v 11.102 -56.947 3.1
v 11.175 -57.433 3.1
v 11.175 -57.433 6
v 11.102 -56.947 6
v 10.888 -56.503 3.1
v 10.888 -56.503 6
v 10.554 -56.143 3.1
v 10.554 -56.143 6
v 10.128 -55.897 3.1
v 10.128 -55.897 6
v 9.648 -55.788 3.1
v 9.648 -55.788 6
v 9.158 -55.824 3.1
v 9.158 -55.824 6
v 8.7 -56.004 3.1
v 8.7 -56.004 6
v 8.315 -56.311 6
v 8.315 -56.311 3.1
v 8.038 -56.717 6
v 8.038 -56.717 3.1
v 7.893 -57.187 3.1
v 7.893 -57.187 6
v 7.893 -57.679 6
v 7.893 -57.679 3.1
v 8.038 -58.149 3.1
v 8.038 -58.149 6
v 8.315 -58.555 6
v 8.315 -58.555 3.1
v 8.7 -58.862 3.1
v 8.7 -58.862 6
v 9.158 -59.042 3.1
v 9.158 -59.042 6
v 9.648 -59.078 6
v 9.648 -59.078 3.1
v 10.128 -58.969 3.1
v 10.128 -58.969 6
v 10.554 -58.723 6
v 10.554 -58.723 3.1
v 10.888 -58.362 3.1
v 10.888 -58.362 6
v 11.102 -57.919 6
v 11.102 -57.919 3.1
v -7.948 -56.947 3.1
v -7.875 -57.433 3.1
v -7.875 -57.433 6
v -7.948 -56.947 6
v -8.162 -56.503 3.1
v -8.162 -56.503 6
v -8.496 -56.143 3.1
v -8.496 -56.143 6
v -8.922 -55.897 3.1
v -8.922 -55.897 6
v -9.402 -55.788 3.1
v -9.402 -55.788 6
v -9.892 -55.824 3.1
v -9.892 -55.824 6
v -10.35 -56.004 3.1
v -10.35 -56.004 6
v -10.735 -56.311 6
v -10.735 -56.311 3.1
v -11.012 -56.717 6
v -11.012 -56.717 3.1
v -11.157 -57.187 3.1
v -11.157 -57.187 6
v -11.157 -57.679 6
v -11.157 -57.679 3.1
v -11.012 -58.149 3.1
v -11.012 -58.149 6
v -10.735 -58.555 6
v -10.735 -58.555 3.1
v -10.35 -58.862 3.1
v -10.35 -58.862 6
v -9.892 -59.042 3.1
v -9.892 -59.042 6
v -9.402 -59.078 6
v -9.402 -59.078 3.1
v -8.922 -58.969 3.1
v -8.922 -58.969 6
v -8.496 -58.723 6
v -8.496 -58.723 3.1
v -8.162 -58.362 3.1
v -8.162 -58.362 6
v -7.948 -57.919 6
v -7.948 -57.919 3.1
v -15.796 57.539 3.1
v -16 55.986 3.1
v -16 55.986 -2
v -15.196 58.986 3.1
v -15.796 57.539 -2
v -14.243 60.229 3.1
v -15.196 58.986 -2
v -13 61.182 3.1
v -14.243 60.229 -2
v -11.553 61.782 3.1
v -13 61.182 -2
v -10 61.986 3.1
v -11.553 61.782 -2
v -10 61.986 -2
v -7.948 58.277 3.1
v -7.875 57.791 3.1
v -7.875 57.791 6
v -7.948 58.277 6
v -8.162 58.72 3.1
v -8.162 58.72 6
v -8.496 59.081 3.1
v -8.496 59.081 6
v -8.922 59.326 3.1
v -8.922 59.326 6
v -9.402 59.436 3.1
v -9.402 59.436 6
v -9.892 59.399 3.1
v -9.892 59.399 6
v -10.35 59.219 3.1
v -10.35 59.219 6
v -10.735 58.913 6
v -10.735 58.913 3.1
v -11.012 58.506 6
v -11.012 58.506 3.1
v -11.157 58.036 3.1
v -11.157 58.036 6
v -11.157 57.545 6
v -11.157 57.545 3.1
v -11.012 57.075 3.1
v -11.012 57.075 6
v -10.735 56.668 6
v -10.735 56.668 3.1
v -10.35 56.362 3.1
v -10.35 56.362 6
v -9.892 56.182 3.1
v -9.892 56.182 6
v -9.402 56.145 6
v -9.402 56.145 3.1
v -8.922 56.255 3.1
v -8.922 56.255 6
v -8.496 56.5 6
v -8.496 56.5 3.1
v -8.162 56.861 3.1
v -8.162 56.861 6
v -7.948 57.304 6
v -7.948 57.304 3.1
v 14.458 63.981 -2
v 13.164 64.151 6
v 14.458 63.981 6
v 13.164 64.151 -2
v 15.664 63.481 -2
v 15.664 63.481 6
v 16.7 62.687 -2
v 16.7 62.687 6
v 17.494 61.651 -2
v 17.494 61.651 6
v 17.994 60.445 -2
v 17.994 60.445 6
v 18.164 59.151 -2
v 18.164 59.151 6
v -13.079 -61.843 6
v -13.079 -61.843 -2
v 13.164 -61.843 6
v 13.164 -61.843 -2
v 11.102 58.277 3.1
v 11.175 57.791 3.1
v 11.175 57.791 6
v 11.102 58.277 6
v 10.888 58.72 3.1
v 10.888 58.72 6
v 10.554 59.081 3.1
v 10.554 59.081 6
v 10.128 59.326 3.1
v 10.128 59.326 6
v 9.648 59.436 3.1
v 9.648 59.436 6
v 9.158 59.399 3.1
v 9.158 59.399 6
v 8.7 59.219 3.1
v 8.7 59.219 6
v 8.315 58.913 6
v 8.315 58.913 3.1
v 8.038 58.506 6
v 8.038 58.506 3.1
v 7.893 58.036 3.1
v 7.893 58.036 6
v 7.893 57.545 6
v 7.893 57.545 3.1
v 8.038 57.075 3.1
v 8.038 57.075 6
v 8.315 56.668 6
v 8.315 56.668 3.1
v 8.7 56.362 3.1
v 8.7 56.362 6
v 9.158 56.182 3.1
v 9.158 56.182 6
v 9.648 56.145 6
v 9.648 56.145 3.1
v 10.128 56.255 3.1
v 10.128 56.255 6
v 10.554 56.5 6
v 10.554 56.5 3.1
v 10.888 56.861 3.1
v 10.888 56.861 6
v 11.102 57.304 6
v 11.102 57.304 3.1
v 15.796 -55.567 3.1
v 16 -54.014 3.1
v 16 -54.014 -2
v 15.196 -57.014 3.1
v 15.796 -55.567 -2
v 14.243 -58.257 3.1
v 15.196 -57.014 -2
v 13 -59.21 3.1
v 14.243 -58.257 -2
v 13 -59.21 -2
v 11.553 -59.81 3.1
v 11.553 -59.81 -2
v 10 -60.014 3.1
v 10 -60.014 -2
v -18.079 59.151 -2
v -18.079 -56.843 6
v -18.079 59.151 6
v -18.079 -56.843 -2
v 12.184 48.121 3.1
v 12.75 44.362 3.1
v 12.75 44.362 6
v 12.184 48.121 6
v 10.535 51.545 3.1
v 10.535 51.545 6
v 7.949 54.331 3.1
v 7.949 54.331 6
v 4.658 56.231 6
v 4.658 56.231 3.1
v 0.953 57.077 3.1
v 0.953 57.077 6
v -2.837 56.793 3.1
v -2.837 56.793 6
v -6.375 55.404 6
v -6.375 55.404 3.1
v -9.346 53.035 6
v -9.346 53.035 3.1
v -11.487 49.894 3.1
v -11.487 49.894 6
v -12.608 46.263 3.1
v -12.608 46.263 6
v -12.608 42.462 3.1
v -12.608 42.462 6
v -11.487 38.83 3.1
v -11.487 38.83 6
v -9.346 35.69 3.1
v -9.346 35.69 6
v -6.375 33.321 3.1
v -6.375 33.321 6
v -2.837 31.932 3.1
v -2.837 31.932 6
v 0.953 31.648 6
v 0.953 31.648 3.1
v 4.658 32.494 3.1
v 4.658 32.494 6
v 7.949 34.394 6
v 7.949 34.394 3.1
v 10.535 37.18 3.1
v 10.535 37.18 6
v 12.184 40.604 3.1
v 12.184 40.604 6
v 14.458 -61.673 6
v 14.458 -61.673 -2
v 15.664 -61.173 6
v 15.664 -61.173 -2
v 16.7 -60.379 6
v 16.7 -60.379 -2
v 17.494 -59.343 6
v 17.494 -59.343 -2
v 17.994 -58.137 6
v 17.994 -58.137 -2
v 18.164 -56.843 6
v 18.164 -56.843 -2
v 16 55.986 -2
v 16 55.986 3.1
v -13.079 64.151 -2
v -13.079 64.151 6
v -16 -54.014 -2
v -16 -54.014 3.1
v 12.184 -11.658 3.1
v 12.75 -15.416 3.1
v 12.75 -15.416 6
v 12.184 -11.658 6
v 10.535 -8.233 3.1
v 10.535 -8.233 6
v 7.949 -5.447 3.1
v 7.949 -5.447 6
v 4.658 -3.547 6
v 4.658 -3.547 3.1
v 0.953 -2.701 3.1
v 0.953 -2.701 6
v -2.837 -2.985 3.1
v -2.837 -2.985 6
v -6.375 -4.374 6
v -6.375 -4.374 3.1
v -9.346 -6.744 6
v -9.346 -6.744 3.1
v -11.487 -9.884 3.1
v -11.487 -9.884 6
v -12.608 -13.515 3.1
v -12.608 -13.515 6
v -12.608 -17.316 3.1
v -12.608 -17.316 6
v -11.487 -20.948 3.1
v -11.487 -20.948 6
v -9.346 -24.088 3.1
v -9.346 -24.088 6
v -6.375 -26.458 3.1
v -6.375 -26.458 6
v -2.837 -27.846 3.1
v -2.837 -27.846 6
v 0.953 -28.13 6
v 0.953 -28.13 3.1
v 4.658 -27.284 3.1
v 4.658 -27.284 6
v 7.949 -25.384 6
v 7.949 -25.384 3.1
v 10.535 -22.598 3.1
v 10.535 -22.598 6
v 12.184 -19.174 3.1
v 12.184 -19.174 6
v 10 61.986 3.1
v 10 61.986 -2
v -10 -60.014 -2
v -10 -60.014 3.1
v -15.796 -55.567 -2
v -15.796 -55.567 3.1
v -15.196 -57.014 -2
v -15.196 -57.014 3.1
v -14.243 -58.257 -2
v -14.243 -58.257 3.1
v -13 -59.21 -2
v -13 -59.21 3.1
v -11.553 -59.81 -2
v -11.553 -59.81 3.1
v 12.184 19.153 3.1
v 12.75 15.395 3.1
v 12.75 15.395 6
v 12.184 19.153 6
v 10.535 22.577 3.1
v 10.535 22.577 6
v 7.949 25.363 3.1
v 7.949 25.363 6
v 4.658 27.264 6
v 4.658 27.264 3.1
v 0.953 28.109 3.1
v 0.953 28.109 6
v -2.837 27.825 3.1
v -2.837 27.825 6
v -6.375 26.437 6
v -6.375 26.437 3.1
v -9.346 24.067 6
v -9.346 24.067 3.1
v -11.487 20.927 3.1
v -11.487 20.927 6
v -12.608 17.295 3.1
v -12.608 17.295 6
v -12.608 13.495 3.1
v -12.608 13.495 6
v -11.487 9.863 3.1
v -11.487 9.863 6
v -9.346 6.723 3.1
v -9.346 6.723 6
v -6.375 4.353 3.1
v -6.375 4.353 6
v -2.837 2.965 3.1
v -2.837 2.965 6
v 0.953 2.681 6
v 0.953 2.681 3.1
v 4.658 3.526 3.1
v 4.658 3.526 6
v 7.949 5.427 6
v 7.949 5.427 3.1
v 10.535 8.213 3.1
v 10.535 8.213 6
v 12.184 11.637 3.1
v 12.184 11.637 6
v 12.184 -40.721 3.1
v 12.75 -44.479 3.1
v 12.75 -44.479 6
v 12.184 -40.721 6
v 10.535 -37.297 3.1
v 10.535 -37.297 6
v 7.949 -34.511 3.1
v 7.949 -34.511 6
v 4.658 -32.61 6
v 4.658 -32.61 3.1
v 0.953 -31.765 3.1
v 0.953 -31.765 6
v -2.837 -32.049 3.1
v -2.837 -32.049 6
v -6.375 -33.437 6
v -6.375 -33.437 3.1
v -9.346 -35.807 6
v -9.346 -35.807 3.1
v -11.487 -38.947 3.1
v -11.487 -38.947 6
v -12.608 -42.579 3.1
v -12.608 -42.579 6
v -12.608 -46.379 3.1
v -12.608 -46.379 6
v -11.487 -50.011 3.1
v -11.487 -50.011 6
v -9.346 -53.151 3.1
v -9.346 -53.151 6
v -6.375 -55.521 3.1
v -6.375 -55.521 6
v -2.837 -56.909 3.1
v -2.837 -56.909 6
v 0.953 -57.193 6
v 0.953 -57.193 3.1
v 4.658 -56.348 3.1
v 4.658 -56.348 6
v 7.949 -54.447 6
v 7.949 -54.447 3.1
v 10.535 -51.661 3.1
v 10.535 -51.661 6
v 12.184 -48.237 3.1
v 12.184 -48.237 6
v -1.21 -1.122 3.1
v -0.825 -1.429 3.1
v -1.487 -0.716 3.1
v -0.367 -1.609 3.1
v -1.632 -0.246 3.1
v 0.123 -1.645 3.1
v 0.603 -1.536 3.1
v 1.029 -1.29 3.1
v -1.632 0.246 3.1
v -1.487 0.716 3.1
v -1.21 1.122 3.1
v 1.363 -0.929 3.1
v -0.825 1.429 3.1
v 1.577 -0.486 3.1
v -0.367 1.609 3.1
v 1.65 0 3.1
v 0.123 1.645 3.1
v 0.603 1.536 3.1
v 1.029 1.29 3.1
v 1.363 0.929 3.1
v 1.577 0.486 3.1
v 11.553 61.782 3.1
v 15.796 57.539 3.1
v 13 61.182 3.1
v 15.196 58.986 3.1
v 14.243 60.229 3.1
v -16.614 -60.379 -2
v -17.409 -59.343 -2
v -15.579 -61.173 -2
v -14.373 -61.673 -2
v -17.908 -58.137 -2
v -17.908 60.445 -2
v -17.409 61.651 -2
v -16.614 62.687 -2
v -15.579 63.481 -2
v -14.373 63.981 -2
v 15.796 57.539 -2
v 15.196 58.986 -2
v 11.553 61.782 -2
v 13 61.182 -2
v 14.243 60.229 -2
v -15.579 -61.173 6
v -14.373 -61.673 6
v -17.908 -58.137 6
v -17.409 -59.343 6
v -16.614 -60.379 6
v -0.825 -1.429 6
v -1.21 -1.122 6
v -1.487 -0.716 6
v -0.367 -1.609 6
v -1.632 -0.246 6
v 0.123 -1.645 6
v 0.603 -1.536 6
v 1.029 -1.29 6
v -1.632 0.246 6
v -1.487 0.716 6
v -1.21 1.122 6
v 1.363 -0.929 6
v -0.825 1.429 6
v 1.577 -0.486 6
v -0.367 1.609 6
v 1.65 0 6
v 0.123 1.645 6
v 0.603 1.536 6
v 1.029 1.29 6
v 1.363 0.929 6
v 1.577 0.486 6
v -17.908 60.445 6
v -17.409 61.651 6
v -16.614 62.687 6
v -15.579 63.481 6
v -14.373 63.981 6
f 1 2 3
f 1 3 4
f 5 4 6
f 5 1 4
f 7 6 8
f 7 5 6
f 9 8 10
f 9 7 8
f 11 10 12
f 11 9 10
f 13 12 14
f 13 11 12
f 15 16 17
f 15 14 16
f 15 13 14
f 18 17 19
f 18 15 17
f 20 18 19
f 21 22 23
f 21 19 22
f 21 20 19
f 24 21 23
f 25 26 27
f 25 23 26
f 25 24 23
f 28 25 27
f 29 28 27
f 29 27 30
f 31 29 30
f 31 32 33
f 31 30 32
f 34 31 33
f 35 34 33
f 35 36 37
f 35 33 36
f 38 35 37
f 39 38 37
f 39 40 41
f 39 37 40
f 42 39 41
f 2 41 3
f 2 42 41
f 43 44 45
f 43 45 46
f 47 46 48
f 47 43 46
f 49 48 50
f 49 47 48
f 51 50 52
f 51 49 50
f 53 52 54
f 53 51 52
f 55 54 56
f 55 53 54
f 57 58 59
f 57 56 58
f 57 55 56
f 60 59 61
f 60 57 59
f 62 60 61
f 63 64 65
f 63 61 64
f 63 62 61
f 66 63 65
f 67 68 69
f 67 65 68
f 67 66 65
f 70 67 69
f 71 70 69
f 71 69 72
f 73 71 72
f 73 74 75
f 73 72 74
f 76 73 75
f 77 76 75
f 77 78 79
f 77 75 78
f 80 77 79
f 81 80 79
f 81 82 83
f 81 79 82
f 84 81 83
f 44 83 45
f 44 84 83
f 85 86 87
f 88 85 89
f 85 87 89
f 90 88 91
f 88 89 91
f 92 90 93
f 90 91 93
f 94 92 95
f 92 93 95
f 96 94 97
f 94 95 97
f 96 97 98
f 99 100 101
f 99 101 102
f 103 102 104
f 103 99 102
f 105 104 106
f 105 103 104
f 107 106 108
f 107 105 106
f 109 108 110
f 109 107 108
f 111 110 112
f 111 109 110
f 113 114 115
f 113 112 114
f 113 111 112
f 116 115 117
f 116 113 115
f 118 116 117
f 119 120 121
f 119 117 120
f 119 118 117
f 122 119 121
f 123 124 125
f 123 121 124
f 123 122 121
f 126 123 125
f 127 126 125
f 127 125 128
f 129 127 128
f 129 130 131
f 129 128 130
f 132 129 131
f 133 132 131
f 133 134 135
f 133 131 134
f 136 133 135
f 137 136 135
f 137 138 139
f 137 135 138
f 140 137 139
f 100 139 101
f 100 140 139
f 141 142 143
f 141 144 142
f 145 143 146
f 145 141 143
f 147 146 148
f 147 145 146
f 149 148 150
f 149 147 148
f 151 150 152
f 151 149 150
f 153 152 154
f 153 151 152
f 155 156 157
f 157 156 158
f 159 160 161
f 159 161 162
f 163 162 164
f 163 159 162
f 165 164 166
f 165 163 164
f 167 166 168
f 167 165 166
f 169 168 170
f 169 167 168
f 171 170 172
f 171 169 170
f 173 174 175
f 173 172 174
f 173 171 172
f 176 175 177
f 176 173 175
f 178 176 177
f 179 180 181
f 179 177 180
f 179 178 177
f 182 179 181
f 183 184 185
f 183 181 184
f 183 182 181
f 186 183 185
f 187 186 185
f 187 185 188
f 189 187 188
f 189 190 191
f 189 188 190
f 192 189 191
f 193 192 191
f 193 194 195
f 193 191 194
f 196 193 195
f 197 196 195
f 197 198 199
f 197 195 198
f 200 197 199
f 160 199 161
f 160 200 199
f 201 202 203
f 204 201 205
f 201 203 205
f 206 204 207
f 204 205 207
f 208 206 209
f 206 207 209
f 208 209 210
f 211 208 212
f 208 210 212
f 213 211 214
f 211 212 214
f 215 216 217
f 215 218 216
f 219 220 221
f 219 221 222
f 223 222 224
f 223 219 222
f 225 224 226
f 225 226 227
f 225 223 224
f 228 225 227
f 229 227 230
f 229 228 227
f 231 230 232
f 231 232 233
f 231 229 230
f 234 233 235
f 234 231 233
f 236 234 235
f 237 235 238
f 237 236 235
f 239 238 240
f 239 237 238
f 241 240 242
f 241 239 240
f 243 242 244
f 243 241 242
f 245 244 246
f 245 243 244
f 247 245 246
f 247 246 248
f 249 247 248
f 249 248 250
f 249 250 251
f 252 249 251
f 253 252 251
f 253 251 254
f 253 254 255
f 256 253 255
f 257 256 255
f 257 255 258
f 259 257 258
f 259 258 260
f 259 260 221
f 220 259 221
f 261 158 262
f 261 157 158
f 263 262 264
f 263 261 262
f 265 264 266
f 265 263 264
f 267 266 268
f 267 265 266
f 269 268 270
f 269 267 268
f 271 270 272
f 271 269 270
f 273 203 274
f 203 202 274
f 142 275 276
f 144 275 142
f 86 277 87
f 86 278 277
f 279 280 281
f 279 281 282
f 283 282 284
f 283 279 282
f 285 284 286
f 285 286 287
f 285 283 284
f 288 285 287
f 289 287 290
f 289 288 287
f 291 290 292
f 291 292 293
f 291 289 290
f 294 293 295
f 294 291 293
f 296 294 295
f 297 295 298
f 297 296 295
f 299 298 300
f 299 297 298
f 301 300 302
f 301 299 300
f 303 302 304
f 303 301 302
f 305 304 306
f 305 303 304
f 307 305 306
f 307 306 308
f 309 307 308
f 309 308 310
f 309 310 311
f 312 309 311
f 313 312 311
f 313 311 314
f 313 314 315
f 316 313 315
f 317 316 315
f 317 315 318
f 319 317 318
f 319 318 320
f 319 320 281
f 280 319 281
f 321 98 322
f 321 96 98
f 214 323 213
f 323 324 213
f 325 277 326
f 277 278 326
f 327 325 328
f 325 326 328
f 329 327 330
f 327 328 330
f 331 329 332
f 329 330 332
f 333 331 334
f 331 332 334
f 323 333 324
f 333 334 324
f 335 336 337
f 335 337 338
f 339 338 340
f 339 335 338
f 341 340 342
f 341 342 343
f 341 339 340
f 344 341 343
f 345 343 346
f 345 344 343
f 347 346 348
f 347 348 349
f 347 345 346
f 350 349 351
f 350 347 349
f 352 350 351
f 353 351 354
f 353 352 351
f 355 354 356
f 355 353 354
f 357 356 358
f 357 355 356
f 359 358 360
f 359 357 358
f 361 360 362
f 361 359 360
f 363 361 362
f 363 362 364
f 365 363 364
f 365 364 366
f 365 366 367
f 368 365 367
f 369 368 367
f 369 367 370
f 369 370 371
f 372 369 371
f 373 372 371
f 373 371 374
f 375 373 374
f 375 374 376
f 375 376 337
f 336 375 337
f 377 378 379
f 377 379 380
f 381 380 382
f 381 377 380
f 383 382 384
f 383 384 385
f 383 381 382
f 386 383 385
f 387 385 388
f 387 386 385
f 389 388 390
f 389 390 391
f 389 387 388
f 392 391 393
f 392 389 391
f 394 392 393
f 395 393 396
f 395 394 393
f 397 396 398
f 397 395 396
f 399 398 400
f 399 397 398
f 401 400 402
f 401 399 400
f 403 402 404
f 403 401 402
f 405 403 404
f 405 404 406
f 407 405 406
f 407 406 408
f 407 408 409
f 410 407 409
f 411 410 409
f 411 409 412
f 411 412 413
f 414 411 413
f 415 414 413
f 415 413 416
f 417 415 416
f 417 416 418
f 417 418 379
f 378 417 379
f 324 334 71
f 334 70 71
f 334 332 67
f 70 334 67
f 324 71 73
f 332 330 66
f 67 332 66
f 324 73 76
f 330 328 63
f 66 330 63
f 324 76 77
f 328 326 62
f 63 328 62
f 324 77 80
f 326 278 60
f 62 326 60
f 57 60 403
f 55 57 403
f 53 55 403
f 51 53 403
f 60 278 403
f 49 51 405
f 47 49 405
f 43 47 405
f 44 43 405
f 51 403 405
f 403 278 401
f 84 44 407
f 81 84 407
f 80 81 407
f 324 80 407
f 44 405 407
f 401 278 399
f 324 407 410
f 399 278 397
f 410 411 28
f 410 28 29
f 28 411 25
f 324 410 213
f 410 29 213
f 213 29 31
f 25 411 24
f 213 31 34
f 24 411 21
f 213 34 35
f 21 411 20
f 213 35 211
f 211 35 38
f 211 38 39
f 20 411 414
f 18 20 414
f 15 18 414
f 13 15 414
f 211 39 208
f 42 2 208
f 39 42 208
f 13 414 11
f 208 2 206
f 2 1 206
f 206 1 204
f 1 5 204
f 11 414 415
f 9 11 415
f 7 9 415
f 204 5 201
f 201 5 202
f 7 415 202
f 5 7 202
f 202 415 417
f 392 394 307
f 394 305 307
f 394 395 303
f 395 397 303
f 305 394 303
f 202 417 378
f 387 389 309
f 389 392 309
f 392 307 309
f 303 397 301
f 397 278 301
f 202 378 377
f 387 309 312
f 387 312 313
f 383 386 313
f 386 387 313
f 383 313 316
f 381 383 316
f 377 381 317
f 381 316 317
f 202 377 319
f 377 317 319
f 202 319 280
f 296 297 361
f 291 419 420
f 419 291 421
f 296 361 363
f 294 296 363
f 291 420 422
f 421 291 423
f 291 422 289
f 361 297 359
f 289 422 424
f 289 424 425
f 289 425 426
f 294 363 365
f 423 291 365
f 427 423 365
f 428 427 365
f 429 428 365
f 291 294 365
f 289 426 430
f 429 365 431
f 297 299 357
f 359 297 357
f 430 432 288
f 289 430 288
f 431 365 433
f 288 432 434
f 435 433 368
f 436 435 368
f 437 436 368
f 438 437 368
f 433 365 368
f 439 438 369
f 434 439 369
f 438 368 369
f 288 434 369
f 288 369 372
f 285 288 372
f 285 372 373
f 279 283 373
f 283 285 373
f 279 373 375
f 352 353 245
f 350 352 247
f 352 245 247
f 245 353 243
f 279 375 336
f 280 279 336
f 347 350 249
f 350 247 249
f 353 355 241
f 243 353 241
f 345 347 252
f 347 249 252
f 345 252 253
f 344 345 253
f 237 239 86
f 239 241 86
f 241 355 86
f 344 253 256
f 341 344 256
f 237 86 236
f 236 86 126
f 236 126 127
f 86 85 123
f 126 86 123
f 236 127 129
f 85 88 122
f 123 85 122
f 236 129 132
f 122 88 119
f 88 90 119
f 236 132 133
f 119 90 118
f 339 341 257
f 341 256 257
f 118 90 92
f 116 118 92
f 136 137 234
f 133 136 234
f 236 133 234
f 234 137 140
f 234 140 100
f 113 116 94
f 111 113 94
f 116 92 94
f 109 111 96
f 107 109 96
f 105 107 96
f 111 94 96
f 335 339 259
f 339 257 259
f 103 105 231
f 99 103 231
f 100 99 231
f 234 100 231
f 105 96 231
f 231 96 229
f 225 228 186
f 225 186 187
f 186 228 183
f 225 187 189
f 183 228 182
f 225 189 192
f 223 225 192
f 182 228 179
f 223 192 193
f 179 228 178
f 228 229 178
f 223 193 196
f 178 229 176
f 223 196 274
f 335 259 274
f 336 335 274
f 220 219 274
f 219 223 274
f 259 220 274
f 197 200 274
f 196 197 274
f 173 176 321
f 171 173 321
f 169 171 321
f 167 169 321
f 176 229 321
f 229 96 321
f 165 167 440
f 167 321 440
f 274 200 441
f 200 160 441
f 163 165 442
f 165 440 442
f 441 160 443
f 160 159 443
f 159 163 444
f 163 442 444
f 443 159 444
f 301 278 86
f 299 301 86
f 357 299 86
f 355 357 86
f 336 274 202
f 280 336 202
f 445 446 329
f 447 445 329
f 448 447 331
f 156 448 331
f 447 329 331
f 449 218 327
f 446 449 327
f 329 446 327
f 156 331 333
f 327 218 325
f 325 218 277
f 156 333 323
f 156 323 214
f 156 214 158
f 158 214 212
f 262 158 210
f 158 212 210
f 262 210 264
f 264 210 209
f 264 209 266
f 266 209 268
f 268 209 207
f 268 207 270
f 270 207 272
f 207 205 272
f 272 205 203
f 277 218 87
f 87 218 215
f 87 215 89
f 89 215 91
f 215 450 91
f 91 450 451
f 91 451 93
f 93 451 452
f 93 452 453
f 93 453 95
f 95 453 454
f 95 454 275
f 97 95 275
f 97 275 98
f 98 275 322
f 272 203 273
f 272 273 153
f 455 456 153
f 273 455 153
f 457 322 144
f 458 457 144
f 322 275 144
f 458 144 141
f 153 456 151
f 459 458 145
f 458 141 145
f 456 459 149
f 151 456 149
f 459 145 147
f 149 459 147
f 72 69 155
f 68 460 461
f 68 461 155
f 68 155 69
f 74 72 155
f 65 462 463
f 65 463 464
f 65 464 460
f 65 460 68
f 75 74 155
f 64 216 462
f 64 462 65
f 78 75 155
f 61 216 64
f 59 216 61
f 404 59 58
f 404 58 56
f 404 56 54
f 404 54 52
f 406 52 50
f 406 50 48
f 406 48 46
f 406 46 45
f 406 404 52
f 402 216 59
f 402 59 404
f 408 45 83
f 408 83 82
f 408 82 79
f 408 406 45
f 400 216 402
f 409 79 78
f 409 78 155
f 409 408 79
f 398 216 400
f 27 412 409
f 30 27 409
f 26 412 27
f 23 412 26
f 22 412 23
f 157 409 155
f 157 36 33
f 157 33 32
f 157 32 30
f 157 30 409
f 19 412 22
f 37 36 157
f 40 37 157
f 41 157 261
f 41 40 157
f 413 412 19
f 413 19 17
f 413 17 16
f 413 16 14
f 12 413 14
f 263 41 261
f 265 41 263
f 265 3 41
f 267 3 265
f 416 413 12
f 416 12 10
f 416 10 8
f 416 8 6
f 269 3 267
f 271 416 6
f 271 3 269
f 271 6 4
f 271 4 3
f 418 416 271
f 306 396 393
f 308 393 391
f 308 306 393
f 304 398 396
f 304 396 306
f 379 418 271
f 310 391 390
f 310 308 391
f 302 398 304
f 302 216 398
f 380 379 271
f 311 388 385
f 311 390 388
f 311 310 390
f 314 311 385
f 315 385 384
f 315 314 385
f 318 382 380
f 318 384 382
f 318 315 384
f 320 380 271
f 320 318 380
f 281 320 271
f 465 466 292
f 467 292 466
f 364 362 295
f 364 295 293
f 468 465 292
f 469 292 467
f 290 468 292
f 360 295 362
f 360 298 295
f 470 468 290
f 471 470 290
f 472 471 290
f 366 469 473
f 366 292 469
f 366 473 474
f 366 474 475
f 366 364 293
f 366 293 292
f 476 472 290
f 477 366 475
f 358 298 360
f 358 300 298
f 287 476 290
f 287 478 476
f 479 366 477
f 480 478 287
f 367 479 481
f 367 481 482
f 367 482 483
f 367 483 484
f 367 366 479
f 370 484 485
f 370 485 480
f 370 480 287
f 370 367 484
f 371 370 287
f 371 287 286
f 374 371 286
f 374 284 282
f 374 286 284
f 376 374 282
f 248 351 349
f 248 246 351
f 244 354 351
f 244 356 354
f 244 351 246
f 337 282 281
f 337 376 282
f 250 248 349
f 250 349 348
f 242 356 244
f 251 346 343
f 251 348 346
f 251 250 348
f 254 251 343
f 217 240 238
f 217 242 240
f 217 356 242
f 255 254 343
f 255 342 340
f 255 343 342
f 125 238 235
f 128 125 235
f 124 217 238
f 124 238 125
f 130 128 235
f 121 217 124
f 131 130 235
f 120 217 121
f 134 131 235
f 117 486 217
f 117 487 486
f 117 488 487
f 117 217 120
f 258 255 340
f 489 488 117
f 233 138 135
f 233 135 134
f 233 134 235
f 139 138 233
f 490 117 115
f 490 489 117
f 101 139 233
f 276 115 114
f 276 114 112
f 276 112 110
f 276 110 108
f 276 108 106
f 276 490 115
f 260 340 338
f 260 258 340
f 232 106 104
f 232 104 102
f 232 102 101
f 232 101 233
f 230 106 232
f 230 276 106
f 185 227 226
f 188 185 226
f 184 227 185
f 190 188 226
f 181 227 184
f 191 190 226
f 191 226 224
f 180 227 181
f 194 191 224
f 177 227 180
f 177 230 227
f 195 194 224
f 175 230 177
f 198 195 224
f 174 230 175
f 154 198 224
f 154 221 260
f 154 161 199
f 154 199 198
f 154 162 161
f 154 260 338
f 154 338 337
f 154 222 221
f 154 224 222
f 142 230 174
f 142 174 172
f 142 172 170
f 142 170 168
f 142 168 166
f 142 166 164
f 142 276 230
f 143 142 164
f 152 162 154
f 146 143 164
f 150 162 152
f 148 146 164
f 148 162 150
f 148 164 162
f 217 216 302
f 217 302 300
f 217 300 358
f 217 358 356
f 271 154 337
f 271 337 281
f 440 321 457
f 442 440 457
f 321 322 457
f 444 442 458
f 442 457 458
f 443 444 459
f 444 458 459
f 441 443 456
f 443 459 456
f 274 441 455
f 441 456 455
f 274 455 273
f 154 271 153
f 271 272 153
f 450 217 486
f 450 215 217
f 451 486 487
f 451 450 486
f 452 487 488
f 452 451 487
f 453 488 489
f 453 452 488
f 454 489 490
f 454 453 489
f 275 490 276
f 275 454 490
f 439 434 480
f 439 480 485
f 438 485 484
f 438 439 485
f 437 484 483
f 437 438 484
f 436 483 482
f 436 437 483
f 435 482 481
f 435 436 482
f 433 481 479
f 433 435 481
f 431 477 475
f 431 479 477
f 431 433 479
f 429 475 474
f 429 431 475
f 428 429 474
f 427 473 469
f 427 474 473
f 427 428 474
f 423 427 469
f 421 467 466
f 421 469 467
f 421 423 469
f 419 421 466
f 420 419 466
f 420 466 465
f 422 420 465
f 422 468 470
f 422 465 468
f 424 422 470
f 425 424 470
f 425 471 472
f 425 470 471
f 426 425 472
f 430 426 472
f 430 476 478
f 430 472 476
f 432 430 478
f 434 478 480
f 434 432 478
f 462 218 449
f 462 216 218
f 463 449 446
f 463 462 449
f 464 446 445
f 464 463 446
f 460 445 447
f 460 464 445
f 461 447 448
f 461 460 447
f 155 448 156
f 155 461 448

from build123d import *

# Parameters (mm, degrees)
F1_START      = 3.1
F0_W          = 32
F0_H          = 122
F0_R          = 1.65
F0_R_2        = 1.25
F0_R_3        = 12.75
F1_DEPTH      = 2.9
F2_START      = 3
F0_R_4        = 2
F0_R_5        = 1
F2_DEPTH      = 2
F3_DEPTH      = 25
F3_DEPTH_BACK = 39.8
F0_W_2        = 36.2426135689
F0_H_2        = 125.9943731129
F4_DEPTH      = 2
F4_DEPTH_BACK = 6
F5_R          = 6
F6_R          = 5


# Not quite as in the source:
# - a feature names something its author has since deleted; it is built from what else it names


with BuildPart() as f1:
    # F0 (on Top) → F1 (new body)
    with BuildSketch(Plane.XY.offset(F1_START)):
        with Locations((0, 0.9860133167)):
            Rectangle(F0_W, F0_H)
        with Locations((-9.525, -57.4329458177)):
            Circle(F0_R, mode=Mode.SUBTRACT)
        with Locations((-9.525, -30.4671674967)):
            Circle(F0_R_2, mode=Mode.SUBTRACT)
        with Locations((0, -44.4789328166)):
            Circle(F0_R_3, mode=Mode.SUBTRACT)
        with Locations((-9.525, 0)):
            Circle(F0_R_2, mode=Mode.SUBTRACT)
        with Locations((0, -15.4157546586)):
            Circle(F0_R_3, mode=Mode.SUBTRACT)
        Circle(F0_R, mode=Mode.SUBTRACT)
        with Locations((9.525, -57.4329458177)):
            Circle(F0_R, mode=Mode.SUBTRACT)
        with Locations((9.525, -30.4671674967)):
            Circle(F0_R_2, mode=Mode.SUBTRACT)
        with Locations((9.525, 0)):
            Circle(F0_R_2, mode=Mode.SUBTRACT)
        with Locations((-9.525, 29.1974432766)):
            Circle(F0_R_2, mode=Mode.SUBTRACT)
        with Locations((0, 15.3948861798)):
            Circle(F0_R_3, mode=Mode.SUBTRACT)
        with Locations((-9.525, 57.7905103564)):
            Circle(F0_R, mode=Mode.SUBTRACT)
        with Locations((0, 44.3624239764)):
            Circle(F0_R_3, mode=Mode.SUBTRACT)
        with Locations((9.525, 29.1974432766)):
            Circle(F0_R_2, mode=Mode.SUBTRACT)
        with Locations((9.525, 57.7905103564)):
            Circle(F0_R, mode=Mode.SUBTRACT)
        with Locations((9.525, 0)):
            Circle(F0_R_2)
        with Locations((-9.525, 0)):
            Circle(F0_R_2)
        with Locations((9.525, 29.1974432766)):
            Circle(F0_R_2)
        with Locations((-9.525, 29.1974432766)):
            Circle(F0_R_2)
        with Locations((9.525, -30.4671674967)):
            Circle(F0_R_2)
        with Locations((-9.525, -30.4671674967)):
            Circle(F0_R_2)
        with Locations((9.525, -57.4329458177)):
            Circle(F0_R)
        with Locations((-9.525, -57.4329458177)):
            Circle(F0_R)
        Circle(F0_R)
        with Locations((9.525, 57.7905103564)):
            Circle(F0_R)
        with Locations((-9.525, 57.7905103564)):
            Circle(F0_R)
    extrude(amount=F1_DEPTH)

    # F0 (on Top) → F2 (cut)
    with BuildSketch(Plane.XY.offset(F2_START)):
        with Locations((0, 44.3624239764)):
            Circle(F0_R_3)
        with Locations((-9.525, 44.3624239764)):
            Circle(F0_R_4, mode=Mode.SUBTRACT)
        with Locations((9.525, 44.3624239764)):
            Circle(F0_R_4, mode=Mode.SUBTRACT)
        with Locations((0, 15.3948861798)):
            Circle(F0_R_3)
        with Locations((-9.525, 15.3948861798)):
            Circle(F0_R_4, mode=Mode.SUBTRACT)
        with Locations((9.525, 15.3948861798)):
            Circle(F0_R_4, mode=Mode.SUBTRACT)
        with Locations((0, -15.4157546586)):
            Circle(F0_R_3)
        with Locations((-9.525, -15.4157546586)):
            Circle(F0_R_4, mode=Mode.SUBTRACT)
        with Locations((9.525, -15.4157546586)):
            Circle(F0_R_4, mode=Mode.SUBTRACT)
        with Locations((0, -44.4789328166)):
            Circle(F0_R_3)
        with Locations((-9.525, -44.4789328166)):
            Circle(F0_R_4, mode=Mode.SUBTRACT)
        with Locations((9.525, -44.4789328166)):
            Circle(F0_R_4, mode=Mode.SUBTRACT)
        with Locations((9.525, 44.3624239764)):
            Circle(F0_R_4)
        with Locations((9.525, 44.3624239764)):
            Circle(F0_R_5, mode=Mode.SUBTRACT)
        with Locations((-9.525, 44.3624239764)):
            Circle(F0_R_4)
        with Locations((-9.525, 44.3624239764)):
            Circle(F0_R_5, mode=Mode.SUBTRACT)
        with Locations((9.525, 15.3948861798)):
            Circle(F0_R_4)
        with Locations((9.525, 15.3948861798)):
            Circle(F0_R_5, mode=Mode.SUBTRACT)
        with Locations((-9.525, 15.3948861798)):
            Circle(F0_R_4)
        with Locations((-9.525, 15.3948861798)):
            Circle(F0_R_5, mode=Mode.SUBTRACT)
        with Locations((9.525, -15.4157546586)):
            Circle(F0_R_4)
        with Locations((9.525, -15.4157546586)):
            Circle(F0_R_5, mode=Mode.SUBTRACT)
        with Locations((-9.525, -15.4157546586)):
            Circle(F0_R_4)
        with Locations((-9.525, -15.4157546586)):
            Circle(F0_R_5, mode=Mode.SUBTRACT)
        with Locations((9.525, -44.4789328166)):
            Circle(F0_R_4)
        with Locations((9.525, -44.4789328166)):
            Circle(F0_R_5, mode=Mode.SUBTRACT)
        with Locations((-9.525, -44.4789328166)):
            Circle(F0_R_4)
        with Locations((-9.525, -44.4789328166)):
            Circle(F0_R_5, mode=Mode.SUBTRACT)
        with Locations((9.525, 44.3624239764)):
            Circle(F0_R_5)
        with Locations((-9.525, 44.3624239764)):
            Circle(F0_R_5)
        with Locations((9.525, 15.3948861798)):
            Circle(F0_R_5)
        with Locations((-9.525, 15.3948861798)):
            Circle(F0_R_5)
        with Locations((9.525, -15.4157546586)):
            Circle(F0_R_5)
        with Locations((-9.525, -15.4157546586)):
            Circle(F0_R_5)
        with Locations((9.525, -44.4789328166)):
            Circle(F0_R_5)
        with Locations((-9.525, -44.4789328166)):
            Circle(F0_R_5)
    extrude(amount=F2_DEPTH, mode=Mode.SUBTRACT)

    # F0 (on Top) → F3 (cut, two sides)
    with BuildSketch(Plane.XY) as f3_sk:
        with Locations((9.525, -57.4329458177)):
            Circle(F0_R)
        Circle(F0_R)
        with Locations((-9.525, -57.4329458177)):
            Circle(F0_R)
        with Locations((-9.525, 57.7905103564)):
            Circle(F0_R)
        with Locations((9.525, 57.7905103564)):
            Circle(F0_R)
    extrude(amount=-F3_DEPTH, mode=Mode.SUBTRACT)
    extrude(f3_sk.sketch, amount=F3_DEPTH_BACK, mode=Mode.SUBTRACT)

    # F0 (on Top) → F4 (join, two sides)
    with BuildSketch(Plane.XY) as f4_sk:
        with Locations((0.0427393243, 1.1539515108)):
            Rectangle(F0_W_2, F0_H_2)
        with Locations((0, 0.9860133167)):
            Rectangle(F0_W, F0_H, mode=Mode.SUBTRACT)
    extrude(amount=-F4_DEPTH)
    extrude(f4_sk.sketch, amount=F4_DEPTH_BACK)

    # F5
    f5_edges = [f1.edges().sort_by_distance(p)[0] for p in [
        (-16, -60.013987, 0.55),
        (16, -60.013987, 0.55),
        (-16, 61.986013, 0.55),
        (16, 61.986013, 0.55),
    ]]
    fillet(f5_edges, radius=F5_R)

    # F6
    f6_edges = [f1.edges().sort_by_distance(p)[0] for p in [
        (18.164046, 64.151138, 2),
        (-18.078567, 64.151138, 2),
        (-18.078567, -61.843235, 2),
        (18.164046, -61.843235, 2),
    ]]
    fillet(f6_edges, radius=F6_R)


solid = f1.part
